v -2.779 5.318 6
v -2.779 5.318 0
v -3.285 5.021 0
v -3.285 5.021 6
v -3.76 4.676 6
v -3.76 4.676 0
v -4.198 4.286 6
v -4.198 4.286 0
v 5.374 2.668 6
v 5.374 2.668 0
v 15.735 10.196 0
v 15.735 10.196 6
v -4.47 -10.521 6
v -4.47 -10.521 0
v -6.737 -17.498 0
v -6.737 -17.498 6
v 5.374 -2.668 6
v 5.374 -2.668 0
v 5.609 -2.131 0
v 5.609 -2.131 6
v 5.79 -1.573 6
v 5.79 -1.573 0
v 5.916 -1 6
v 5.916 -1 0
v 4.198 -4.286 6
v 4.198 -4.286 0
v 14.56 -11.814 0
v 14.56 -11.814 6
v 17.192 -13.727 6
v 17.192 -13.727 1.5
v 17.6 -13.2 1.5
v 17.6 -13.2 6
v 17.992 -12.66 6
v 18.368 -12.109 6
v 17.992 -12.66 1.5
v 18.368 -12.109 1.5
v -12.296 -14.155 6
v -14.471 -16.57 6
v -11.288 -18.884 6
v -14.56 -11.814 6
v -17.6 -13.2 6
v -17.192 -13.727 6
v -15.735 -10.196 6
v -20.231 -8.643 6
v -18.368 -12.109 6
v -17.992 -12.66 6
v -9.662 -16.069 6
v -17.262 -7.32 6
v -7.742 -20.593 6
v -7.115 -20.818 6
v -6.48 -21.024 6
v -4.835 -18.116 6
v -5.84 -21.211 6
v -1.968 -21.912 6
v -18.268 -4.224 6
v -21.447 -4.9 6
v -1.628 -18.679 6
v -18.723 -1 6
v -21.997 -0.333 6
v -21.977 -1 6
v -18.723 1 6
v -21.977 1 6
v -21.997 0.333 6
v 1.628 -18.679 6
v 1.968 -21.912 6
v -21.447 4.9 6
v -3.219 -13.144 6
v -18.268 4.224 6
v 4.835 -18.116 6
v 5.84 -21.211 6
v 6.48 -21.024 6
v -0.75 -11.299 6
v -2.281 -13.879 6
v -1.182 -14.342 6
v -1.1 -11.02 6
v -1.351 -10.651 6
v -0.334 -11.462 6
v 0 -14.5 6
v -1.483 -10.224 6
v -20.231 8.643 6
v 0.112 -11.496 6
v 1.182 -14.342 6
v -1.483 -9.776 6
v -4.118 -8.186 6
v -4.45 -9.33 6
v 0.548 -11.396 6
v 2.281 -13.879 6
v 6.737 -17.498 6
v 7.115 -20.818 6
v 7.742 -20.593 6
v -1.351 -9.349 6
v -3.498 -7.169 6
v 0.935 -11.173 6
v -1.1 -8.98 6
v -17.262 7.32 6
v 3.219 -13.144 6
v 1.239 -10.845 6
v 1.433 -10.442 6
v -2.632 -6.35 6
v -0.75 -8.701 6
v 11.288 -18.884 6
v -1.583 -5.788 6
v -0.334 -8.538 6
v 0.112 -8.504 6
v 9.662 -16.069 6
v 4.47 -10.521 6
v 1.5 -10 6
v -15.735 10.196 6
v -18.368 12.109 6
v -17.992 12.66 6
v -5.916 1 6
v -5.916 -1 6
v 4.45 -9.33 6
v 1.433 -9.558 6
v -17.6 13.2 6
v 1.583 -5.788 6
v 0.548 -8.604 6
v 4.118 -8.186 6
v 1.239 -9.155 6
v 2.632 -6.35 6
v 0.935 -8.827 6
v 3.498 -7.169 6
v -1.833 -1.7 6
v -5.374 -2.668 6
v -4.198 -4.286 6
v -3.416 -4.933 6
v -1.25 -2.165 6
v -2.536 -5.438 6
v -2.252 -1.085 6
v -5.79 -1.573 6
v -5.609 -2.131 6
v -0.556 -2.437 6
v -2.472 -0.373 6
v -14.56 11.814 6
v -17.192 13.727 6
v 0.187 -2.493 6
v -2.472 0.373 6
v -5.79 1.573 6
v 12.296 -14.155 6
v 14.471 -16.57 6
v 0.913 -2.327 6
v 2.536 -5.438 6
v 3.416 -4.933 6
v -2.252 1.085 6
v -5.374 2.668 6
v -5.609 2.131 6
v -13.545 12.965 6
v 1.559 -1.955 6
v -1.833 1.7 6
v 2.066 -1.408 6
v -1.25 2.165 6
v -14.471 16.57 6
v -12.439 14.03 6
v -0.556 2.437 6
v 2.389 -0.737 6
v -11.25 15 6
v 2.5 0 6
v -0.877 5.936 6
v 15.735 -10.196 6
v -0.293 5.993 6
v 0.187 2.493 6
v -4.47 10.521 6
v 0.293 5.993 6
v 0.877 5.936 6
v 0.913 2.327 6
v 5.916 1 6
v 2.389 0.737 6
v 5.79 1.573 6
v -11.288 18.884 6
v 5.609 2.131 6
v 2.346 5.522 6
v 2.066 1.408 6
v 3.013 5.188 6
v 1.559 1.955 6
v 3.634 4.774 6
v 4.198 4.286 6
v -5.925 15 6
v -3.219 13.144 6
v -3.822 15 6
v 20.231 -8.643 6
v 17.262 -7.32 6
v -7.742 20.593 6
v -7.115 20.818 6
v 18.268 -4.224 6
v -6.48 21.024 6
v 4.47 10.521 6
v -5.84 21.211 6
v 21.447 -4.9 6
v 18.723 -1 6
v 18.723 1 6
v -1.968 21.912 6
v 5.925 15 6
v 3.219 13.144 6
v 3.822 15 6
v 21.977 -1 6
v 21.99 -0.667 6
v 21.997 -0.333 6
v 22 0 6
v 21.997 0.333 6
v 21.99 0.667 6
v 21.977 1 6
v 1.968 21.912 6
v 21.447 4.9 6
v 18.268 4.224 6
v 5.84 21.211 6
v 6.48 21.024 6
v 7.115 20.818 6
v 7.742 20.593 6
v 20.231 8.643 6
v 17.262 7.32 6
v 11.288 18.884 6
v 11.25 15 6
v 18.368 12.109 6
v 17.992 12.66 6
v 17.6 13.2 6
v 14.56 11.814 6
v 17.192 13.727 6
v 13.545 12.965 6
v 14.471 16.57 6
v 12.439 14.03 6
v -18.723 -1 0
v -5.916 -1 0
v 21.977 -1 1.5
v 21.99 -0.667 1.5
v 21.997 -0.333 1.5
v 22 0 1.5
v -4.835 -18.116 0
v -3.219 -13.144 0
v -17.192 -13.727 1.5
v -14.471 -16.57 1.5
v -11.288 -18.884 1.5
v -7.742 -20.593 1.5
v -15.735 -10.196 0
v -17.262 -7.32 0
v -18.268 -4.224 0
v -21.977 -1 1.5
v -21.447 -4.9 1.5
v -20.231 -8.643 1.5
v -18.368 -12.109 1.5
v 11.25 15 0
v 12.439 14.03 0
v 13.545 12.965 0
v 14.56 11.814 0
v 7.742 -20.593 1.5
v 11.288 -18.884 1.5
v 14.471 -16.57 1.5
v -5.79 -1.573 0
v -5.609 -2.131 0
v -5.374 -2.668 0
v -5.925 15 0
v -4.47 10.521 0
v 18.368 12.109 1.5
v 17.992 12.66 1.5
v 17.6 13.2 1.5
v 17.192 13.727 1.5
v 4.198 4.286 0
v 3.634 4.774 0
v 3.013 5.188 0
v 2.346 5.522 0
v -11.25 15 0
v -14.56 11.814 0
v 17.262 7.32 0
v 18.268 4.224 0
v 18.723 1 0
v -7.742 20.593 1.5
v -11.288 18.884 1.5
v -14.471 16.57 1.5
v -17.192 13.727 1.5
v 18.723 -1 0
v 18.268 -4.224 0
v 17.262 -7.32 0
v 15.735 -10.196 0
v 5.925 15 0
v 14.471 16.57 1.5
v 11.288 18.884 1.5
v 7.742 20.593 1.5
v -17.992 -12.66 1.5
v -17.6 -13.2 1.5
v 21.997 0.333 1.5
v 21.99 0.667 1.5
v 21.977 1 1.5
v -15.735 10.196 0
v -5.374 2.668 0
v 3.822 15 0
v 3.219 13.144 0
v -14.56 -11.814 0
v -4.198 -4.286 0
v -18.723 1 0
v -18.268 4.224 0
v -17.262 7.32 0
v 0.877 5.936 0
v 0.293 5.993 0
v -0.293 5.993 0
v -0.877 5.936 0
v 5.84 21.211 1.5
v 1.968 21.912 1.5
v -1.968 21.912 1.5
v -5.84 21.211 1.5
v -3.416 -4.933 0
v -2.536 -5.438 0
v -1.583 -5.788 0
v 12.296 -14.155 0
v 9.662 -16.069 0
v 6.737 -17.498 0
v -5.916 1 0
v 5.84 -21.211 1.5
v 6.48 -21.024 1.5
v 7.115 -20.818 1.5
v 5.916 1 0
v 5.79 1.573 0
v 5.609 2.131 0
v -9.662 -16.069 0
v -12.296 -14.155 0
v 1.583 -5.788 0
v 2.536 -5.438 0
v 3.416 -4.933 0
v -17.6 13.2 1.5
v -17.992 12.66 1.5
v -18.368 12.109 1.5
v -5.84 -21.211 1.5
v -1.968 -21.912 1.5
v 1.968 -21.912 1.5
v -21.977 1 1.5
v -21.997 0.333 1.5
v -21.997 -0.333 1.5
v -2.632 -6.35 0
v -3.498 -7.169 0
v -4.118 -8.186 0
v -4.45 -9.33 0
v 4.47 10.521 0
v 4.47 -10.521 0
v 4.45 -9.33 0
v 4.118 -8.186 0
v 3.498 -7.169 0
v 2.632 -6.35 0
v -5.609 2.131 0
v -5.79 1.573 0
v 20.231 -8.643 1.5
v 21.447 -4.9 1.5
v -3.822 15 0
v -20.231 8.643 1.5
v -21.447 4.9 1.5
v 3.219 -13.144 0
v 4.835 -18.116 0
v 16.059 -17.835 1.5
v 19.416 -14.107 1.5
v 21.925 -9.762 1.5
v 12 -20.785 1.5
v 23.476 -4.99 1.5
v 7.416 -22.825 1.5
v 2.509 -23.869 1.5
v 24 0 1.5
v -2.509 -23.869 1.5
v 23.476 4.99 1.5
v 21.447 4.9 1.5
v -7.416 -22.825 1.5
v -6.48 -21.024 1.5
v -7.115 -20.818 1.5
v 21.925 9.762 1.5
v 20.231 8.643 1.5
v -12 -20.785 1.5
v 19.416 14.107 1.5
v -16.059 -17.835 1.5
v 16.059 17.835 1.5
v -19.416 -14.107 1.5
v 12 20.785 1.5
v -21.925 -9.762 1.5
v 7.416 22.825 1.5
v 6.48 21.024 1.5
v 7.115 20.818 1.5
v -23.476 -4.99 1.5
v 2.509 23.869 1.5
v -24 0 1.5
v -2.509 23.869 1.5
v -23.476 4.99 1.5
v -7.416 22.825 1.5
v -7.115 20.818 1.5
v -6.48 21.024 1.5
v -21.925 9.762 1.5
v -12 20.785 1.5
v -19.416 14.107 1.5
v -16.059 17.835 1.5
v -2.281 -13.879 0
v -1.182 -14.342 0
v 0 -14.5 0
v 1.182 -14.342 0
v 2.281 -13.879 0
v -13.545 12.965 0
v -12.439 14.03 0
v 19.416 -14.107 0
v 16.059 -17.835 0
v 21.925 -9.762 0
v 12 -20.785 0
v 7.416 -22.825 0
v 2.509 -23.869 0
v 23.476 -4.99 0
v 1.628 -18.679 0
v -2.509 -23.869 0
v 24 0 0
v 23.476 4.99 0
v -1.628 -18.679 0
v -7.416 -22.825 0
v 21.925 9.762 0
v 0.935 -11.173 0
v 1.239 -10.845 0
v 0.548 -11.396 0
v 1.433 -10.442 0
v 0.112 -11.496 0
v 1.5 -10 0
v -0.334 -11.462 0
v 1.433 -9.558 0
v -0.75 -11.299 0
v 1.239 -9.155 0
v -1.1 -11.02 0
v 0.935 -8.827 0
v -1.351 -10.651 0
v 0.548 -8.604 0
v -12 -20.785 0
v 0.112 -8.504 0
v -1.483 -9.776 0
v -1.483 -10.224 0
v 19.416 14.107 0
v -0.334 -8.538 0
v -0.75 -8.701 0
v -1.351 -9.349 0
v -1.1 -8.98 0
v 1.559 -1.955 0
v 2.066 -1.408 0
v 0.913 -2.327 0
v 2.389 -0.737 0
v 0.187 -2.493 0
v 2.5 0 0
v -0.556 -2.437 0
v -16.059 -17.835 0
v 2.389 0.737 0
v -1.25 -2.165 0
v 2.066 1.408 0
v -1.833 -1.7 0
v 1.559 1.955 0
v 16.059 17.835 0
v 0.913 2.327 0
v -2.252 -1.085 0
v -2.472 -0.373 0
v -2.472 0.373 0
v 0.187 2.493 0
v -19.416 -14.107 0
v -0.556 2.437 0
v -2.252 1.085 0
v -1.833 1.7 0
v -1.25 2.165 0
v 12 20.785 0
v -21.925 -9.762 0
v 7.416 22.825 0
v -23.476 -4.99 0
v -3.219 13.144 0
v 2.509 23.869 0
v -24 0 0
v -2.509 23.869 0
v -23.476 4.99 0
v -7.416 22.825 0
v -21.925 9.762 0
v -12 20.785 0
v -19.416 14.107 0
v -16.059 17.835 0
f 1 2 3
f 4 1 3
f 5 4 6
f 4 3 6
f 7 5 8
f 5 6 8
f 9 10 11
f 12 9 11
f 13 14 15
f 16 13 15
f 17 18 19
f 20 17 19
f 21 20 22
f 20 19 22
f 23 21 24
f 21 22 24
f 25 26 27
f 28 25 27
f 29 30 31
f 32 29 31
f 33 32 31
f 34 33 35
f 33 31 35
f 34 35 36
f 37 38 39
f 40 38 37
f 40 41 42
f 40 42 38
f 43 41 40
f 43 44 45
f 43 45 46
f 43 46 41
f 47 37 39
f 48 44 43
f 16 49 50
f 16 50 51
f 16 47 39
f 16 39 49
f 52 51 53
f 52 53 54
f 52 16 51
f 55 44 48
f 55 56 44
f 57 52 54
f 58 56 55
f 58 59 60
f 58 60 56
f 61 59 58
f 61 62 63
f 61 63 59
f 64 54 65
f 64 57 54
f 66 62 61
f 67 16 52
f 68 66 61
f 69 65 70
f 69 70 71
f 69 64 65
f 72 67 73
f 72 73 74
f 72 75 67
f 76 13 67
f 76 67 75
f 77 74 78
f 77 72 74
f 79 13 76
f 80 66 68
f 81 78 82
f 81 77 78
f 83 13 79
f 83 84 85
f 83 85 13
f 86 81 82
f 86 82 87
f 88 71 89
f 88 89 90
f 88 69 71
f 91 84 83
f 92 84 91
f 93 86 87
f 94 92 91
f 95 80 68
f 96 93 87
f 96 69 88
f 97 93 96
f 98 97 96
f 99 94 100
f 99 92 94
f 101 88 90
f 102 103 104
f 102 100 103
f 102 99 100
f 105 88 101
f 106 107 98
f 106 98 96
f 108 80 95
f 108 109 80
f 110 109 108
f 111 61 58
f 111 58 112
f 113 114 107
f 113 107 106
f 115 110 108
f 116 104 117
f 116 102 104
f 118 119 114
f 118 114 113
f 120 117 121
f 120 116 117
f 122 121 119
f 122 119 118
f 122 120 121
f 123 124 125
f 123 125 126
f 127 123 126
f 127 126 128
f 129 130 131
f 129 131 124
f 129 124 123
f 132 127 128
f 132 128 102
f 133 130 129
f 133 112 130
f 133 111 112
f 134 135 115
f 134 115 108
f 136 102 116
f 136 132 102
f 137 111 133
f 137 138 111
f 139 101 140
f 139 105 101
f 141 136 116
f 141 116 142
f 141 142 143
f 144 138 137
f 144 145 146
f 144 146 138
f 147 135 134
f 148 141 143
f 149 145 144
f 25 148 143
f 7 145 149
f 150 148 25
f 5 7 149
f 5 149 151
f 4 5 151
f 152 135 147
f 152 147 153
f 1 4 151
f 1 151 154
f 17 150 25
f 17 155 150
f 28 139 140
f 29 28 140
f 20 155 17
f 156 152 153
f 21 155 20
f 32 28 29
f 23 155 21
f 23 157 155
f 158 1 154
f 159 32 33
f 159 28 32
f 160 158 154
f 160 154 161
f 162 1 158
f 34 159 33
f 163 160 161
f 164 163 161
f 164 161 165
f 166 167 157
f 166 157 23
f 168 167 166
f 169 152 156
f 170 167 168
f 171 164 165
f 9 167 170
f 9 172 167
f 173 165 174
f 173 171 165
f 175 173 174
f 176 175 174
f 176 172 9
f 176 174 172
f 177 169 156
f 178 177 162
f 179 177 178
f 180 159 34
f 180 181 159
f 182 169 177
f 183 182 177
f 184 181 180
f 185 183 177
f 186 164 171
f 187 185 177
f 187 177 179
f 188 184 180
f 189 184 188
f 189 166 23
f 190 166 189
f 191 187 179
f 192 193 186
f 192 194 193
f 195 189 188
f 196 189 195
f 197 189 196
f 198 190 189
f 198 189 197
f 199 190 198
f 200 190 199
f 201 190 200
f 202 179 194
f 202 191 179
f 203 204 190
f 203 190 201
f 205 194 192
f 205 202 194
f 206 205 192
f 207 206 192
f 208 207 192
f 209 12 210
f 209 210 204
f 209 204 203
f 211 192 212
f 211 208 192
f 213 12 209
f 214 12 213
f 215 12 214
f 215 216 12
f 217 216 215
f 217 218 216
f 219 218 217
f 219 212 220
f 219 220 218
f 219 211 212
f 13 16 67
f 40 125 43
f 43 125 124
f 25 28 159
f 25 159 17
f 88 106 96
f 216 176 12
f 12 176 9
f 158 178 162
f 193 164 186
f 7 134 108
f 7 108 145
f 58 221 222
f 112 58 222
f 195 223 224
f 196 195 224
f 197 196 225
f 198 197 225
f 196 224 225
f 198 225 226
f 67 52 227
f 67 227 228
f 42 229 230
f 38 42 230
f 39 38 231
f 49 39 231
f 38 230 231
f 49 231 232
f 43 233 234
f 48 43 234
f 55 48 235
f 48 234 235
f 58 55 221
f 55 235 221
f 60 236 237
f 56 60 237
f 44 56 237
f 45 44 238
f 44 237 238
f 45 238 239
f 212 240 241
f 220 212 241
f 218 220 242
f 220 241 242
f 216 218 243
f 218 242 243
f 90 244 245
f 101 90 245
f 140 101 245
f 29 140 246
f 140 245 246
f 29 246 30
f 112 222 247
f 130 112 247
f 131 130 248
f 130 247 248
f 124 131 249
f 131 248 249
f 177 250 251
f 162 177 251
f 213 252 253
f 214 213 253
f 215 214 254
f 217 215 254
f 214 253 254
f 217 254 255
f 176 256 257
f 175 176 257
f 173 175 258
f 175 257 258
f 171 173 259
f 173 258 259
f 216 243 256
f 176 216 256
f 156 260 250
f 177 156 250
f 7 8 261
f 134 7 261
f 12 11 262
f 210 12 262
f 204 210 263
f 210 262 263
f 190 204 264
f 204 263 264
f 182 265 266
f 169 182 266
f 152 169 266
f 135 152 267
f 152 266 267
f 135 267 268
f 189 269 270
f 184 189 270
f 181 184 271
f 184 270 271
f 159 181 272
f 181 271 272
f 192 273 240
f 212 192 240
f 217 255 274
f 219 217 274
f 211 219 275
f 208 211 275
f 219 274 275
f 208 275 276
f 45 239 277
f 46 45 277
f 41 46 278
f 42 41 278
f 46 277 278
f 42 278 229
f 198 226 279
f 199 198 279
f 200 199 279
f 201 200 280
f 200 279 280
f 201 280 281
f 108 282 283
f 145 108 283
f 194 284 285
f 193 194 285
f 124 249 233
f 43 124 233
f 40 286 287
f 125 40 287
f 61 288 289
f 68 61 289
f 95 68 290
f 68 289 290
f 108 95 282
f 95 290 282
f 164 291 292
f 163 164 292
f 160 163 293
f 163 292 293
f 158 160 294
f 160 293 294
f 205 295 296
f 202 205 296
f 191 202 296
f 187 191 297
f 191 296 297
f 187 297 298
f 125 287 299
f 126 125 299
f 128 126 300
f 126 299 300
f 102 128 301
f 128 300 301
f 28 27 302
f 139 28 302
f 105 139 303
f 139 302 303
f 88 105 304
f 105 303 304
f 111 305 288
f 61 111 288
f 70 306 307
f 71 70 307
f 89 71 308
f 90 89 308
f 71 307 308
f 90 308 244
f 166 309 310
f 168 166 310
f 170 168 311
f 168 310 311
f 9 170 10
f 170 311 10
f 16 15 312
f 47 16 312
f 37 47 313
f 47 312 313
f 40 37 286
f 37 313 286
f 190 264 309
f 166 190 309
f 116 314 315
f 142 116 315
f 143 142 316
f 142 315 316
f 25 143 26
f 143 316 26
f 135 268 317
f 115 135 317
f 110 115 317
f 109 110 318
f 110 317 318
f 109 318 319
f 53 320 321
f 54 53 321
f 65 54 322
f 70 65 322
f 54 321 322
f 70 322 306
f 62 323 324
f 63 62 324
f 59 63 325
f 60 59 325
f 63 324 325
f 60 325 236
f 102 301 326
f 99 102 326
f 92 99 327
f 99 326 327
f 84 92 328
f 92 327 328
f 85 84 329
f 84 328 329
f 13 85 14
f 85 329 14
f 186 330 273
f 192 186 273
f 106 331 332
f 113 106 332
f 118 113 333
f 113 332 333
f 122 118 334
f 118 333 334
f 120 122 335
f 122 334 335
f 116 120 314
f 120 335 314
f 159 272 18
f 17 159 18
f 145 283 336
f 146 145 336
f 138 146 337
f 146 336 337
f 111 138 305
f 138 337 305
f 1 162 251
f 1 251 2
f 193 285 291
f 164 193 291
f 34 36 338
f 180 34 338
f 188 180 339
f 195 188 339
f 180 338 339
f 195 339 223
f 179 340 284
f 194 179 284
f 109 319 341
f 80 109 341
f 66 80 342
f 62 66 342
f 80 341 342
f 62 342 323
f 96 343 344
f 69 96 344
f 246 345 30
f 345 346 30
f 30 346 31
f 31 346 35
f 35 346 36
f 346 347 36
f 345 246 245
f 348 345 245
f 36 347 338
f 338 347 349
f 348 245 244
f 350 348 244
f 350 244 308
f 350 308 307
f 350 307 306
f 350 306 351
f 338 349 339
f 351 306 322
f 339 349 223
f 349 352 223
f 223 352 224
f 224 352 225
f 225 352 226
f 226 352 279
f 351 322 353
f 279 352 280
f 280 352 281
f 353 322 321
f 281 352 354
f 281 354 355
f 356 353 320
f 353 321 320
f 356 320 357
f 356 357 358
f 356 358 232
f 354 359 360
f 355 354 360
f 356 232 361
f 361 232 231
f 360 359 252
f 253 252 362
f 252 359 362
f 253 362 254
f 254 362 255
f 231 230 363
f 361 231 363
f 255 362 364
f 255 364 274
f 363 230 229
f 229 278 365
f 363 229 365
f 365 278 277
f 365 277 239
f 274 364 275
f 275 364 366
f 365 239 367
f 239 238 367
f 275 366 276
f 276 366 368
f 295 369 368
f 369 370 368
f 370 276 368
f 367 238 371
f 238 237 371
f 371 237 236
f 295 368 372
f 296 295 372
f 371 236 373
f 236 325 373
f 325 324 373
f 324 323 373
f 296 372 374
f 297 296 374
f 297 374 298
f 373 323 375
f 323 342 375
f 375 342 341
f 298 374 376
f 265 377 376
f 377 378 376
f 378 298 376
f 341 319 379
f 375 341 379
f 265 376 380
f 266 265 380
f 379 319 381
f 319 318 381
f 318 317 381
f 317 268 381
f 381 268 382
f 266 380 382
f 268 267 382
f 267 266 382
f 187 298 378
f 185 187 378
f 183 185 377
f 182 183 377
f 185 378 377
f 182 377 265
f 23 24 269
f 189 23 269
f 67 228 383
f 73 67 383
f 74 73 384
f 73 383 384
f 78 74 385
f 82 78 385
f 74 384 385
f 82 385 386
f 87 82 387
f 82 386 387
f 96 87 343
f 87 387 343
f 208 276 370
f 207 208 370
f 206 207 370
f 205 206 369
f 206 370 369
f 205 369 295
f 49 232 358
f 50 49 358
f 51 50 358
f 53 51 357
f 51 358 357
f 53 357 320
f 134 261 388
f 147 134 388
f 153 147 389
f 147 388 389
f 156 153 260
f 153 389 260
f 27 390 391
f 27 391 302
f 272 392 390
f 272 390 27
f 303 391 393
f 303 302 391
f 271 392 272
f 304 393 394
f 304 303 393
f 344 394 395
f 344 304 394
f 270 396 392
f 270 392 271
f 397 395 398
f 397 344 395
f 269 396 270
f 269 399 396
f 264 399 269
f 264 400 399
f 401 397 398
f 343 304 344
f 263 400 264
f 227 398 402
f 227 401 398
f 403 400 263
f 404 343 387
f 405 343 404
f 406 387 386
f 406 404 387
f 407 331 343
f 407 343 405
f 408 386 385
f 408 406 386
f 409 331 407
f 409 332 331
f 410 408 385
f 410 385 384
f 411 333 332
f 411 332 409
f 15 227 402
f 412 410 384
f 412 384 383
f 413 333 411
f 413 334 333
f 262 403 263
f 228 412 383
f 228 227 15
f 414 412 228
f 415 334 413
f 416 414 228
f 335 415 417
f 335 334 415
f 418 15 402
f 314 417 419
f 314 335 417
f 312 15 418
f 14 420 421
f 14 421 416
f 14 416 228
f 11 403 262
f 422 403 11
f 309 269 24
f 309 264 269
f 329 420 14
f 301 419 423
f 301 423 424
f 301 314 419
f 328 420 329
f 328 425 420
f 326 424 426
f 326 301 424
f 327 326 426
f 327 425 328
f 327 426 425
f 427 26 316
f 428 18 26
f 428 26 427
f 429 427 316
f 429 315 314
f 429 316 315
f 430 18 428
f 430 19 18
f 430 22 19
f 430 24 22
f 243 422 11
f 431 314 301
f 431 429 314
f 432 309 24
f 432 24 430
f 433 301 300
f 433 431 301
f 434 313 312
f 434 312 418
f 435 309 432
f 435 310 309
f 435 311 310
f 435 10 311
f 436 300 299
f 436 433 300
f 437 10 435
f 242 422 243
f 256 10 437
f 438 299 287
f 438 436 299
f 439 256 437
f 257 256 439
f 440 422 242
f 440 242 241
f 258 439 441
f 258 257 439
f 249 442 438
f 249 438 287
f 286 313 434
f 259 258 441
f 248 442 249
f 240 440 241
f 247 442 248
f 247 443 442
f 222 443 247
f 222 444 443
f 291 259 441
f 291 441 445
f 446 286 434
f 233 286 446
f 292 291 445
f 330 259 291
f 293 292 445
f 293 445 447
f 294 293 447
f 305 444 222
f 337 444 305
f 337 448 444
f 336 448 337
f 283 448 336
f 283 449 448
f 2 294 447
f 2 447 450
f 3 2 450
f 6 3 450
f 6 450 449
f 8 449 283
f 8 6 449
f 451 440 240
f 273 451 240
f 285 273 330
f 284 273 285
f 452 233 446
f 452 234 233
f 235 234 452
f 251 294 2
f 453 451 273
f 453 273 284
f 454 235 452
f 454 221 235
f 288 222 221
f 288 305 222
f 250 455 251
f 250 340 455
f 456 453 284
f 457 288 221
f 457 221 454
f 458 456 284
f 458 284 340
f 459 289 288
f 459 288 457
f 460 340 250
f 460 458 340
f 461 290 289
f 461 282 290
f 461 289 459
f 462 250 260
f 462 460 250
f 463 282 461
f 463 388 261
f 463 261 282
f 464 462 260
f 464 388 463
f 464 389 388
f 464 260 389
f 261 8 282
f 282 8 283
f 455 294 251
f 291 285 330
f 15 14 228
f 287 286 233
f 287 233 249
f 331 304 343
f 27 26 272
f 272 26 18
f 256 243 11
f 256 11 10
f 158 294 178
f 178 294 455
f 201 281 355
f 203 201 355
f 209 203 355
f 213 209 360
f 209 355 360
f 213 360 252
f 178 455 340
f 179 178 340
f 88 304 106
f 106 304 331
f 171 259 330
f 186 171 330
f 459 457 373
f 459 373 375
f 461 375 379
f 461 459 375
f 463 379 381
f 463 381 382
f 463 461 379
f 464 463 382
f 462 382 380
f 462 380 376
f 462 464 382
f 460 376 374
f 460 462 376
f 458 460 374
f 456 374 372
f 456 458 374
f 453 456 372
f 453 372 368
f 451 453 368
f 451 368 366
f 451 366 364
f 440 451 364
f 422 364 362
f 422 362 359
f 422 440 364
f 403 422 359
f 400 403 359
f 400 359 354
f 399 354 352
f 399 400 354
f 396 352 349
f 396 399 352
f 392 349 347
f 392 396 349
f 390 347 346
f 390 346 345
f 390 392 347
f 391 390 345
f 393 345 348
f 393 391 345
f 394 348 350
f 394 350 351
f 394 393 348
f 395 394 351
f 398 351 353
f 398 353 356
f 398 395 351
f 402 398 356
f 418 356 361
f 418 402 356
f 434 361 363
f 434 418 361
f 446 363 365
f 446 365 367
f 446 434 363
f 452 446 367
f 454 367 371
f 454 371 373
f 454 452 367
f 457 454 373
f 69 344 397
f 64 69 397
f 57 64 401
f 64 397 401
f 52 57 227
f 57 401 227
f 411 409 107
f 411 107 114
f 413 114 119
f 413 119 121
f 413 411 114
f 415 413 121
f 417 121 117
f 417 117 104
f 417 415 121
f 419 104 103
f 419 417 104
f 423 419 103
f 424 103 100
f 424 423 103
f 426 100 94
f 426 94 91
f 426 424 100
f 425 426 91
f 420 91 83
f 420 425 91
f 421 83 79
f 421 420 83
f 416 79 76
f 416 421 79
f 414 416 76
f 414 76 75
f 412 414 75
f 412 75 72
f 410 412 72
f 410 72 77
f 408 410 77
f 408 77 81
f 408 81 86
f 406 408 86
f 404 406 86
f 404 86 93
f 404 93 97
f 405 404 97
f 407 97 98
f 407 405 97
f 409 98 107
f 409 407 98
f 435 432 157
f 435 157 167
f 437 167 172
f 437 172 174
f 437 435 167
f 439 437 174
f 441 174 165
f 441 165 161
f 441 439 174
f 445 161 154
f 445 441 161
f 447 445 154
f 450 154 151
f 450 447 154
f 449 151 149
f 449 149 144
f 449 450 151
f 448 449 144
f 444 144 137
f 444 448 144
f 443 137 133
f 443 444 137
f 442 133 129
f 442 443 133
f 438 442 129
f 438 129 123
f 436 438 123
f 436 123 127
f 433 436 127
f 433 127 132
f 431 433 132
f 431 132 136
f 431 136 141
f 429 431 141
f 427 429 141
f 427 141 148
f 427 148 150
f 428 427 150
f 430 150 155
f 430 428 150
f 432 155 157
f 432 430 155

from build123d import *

# Parameters (mm, degrees)
ESQUISSE1_R        = 6
ESQUISSE1_R_2      = 2.5
ESQUISSE1_R_3      = 1.5
BOSS_EXTRU_1_DEPTH = 6
ESQUISSE4_R        = 24
ESQUISSE4_R_2      = 22
BOSS_EXTRU_3_DEPTH = 1.5


with BuildPart() as part:
    # Esquisse1 → Boss.-Extru.1 (new body)
    # profile 1 of 57: a face of its own
    with BuildSketch(Plane.XY):
        Circle(ESQUISSE1_R)
        Circle(ESQUISSE1_R_2, mode=Mode.SUBTRACT)
    # profile 2 of 57: a face of its own
    with BuildSketch(Plane.XY):
        with BuildLine():
            ThreePointArc((4.469792035, -10.520537382), (3.841677281, -7.656601684), (1.582669817, -5.7875))
            ThreePointArc((1.582669817, -5.7875), (0, -6), (-1.582669817, -5.7875))
            ThreePointArc((-1.582669817, -5.7875), (-3.841677281, -7.656601684), (-4.469792035, -10.520537382))
            ThreePointArc((-4.469792035, -10.520537382), (-4.06221109, -11.936089115), (-3.219339867, -13.144177288))
            ThreePointArc((-3.219339867, -13.144177288), (0, -14.5), (3.219339867, -13.144177288))
            ThreePointArc((3.219339867, -13.144177288), (4.06221109, -11.936089115), (4.469792035, -10.520537382))
        make_face()
        with Locations((0, -10)):
            Circle(ESQUISSE1_R_3, mode=Mode.SUBTRACT)
    # profile 3 of 57: a face of its own
    with BuildSketch(Plane.XY):
        with BuildLine():
            ThreePointArc((4.834765807, -18.115947107), (5.794068645, -17.832309681), (6.736878839, -17.497913119))
            Line((6.736878839, -17.497913119), (4.469792035, -10.520537382))
            ThreePointArc((4.469792035, -10.520537382), (4.06221109, -11.936089115), (3.219339867, -13.144177288))
            Line((3.219339867, -13.144177288), (4.834765807, -18.115947107))
        make_face()
    # profile 4 of 57: a face of its own
    with BuildSketch(Plane.XY):
        with BuildLine():
            ThreePointArc((-3.219339867, -13.144177288), (-4.06221109, -11.936089115), (-4.469792035, -10.520537382))
            Line((-4.469792035, -10.520537382), (-6.736878839, -17.497913119))
            ThreePointArc((-6.736878839, -17.497913119), (-5.794068645, -17.832309681), (-4.834765807, -18.115947107))
            Line((-4.834765807, -18.115947107), (-3.219339867, -13.144177288))
        make_face()
    # profile 5 of 57: a face of its own
    with BuildSketch(Plane.XY):
        with BuildLine():
            Line((-14.559694243, -11.814305039), (-4.198423832, -4.286401442))
            ThreePointArc((-4.198423832, -4.286401442), (-4.854101966, -3.526711514), (-5.373994337, -2.668367454))
            Line((-5.373994337, -2.668367454), (-15.735264747, -10.196271051))
            ThreePointArc((-15.735264747, -10.196271051), (-15.169068645, -11.02097348), (-14.559694243, -11.814305039))
        make_face()
    # profile 6 of 57: a face of its own
    with BuildSketch(Plane.XY):
        with BuildLine():
            Line((-18.723314343, -1), (-5.916079783, -1))
            ThreePointArc((-5.916079783, -1), (-6, 0), (-5.916079783, 1))
            Line((-5.916079783, 1), (-18.723314343, 1))
            ThreePointArc((-18.723314343, 1), (-18.75, 0), (-18.723314343, -1))
        make_face()
    # profile 7 of 57: a face of its own
    with BuildSketch(Plane.XY):
        with BuildLine():
            Line((-15.735264747, 10.196271051), (-5.373994337, 2.668367454))
            ThreePointArc((-5.373994337, 2.668367454), (-4.854101966, 3.526711514), (-4.198423832, 4.286401442))
            Line((-4.198423832, 4.286401442), (-14.559694243, 11.814305039))
            ThreePointArc((-14.559694243, 11.814305039), (-15.169068645, 11.02097348), (-15.735264747, 10.196271051))
        make_face()
    # profile 8 of 57: a face of its own
    with BuildSketch(Plane.XY):
        with BuildLine():
            ThreePointArc((-2.779225709, 5.317509234), (-1.854101966, 5.706339098), (-0.877112677, 5.935543223))
            Line((-0.877112677, 5.935543223), (-3.219339867, 13.144177288))
            Line((-3.219339867, 13.144177288), (-3.822333219, 15))
            Line((-3.822333219, 15), (-5.925257668, 15))
            Line((-5.925257668, 15), (-4.469792035, 10.520537382))
            Line((-4.469792035, 10.520537382), (-2.779225709, 5.317509234))
        make_face()
    # profile 9 of 57: a face of its own
    with BuildSketch(Plane.XY):
        with BuildLine():
            ThreePointArc((0.877112677, 5.935543223), (1.624852602, 5.775798994), (2.346205228, 5.522256878))
            Line((2.346205228, 5.522256878), (4.469792035, 10.520537382))
            Line((4.469792035, 10.520537382), (5.925257668, 15))
            Line((5.925257668, 15), (3.822333219, 15))
            Line((3.822333219, 15), (3.219339867, 13.144177288))
            Line((3.219339867, 13.144177288), (0.877112677, 5.935543223))
        make_face()
    # profile 10 of 57: a face of its own
    with BuildSketch(Plane.XY):
        with BuildLine():
            ThreePointArc((4.198423832, 4.286401442), (4.854101966, 3.526711514), (5.373994337, 2.668367454))
            Line((5.373994337, 2.668367454), (15.735264747, 10.196271051))
            ThreePointArc((15.735264747, 10.196271051), (15.169068645, 11.02097348), (14.559694243, 11.814305039))
            Line((14.559694243, 11.814305039), (4.198423832, 4.286401442))
        make_face()
    # profile 11 of 57: a face of its own
    with BuildSketch(Plane.XY):
        with BuildLine():
            ThreePointArc((6, 0), (5.978983137, -0.501757562), (5.916079783, -1))
            Line((5.916079783, -1), (18.723314343, -1))
            ThreePointArc((18.723314343, -1), (18.743327399, -0.500177999), (18.75, 0))
            ThreePointArc((18.75, 0), (18.743327399, 0.500177999), (18.723314343, 1))
            Line((18.723314343, 1), (5.916079783, 1))
            ThreePointArc((5.916079783, 1), (5.978983137, 0.501757562), (6, 0))
        make_face()
    # profile 12 of 57: a face of its own
    with BuildSketch(Plane.XY):
        with BuildLine():
            Line((15.735264747, -10.196271051), (5.373994337, -2.668367454))
            ThreePointArc((5.373994337, -2.668367454), (4.854101966, -3.526711514), (4.198423832, -4.286401442))
            Line((4.198423832, -4.286401442), (14.559694243, -11.814305039))
            ThreePointArc((14.559694243, -11.814305039), (15.169068645, -11.02097348), (15.735264747, -10.196271051))
        make_face()
    # profile 13 of 57: a face of its own
    with BuildSketch(Plane.XY):
        with BuildLine():
            ThreePointArc((-6.968959178, -18.212182955), (-11.46181242, -15.77583139), (-15.167288456, -12.255748075))
            Line((-15.167288456, -12.255748075), (-17.192192367, -13.726926882))
            ThreePointArc((-17.192192367, -13.726926882), (-12.93127555, -17.798373876), (-7.742403648, -20.592600267))
            Line((-7.742403648, -20.592600267), (-6.968959178, -18.212182955))
        make_face()
    # profile 14 of 57: a face of its own
    with BuildSketch(Plane.XY):
        with BuildLine():
            Line((-17.192192367, -13.726926882), (-15.167288456, -12.255748075))
            ThreePointArc((-15.167288456, -12.255748075), (-15.77583139, -11.46181242), (-16.342858961, -10.637714087))
            Line((-16.342858961, -10.637714087), (-18.367762872, -12.108892893))
            ThreePointArc((-18.367762872, -12.108892893), (-17.798373876, -12.93127555), (-17.192192367, -13.726926882))
        make_face()
    # profile 15 of 57: a face of its own
    with BuildSketch(Plane.XY):
        with BuildLine():
            Line((-18.367762872, -12.108892893), (-16.342858961, -10.637714087))
            ThreePointArc((-16.342858961, -10.637714087), (-18.545602068, -6.02583139), (-19.474342094, -1))
            Line((-19.474342094, -1), (-21.977260976, -1))
            ThreePointArc((-21.977260976, -1), (-20.923243358, -6.798373876), (-18.367762872, -12.108892893))
        make_face()
    # profile 16 of 57: a face of its own
    with BuildSketch(Plane.XY):
        with BuildLine():
            Line((-21.977260976, -1), (-19.474342094, -1))
            ThreePointArc((-19.474342094, -1), (-19.5, 0), (-19.474342094, 1))
            Line((-19.474342094, 1), (-21.977260976, 1))
            ThreePointArc((-21.977260976, 1), (-22, 0), (-21.977260976, -1))
        make_face()
    # profile 17 of 57: a face of its own
    with BuildSketch(Plane.XY):
        with BuildLine():
            Line((-21.977260976, 1), (-19.474342094, 1))
            ThreePointArc((-19.474342094, 1), (-18.545602068, 6.02583139), (-16.342858961, 10.637714087))
            Line((-16.342858961, 10.637714087), (-18.367762872, 12.108892893))
            ThreePointArc((-18.367762872, 12.108892893), (-20.923243358, 6.798373876), (-21.977260976, 1))
        make_face()
    # profile 18 of 57: a face of its own
    with BuildSketch(Plane.XY):
        with BuildLine():
            Line((-18.367762872, 12.108892893), (-16.342858961, 10.637714087))
            ThreePointArc((-16.342858961, 10.637714087), (-15.77583139, 11.46181242), (-15.167288456, 12.255748075))
            Line((-15.167288456, 12.255748075), (-17.192192367, 13.726926882))
            ThreePointArc((-17.192192367, 13.726926882), (-17.798373876, 12.93127555), (-18.367762872, 12.108892893))
        make_face()
    # profile 19 of 57: a face of its own
    with BuildSketch(Plane.XY):
        with BuildLine():
            ThreePointArc((-15.167288456, 12.255748075), (-11.46181242, 15.77583139), (-6.968959178, 18.212182955))
            Line((-6.968959178, 18.212182955), (-7.742403648, 20.592600267))
            ThreePointArc((-7.742403648, 20.592600267), (-12.93127555, 17.798373876), (-17.192192367, 13.726926882))
            Line((-17.192192367, 13.726926882), (-15.167288456, 12.255748075))
        make_face()
    # profile 20 of 57: a face of its own
    with BuildSketch(Plane.XY):
        with BuildLine():
            ThreePointArc((-6.968959178, 18.212182955), (-6.02583139, 18.545602068), (-5.066846145, 18.830216944))
            Line((-5.066846145, 18.830216944), (-5.840290615, 21.210634256))
            ThreePointArc((-5.840290615, 21.210634256), (-6.798373876, 20.923243358), (-7.742403648, 20.592600267))
            Line((-7.742403648, 20.592600267), (-6.968959178, 18.212182955))
        make_face()
    # profile 21 of 57: a face of its own
    with BuildSketch(Plane.XY):
        with BuildLine():
            Line((-11.25, 15), (-5.925257668, 15))
            Line((-5.925257668, 15), (-6.736878839, 17.497913119))
            ThreePointArc((-6.736878839, 17.497913119), (-9.079749175, 16.404897285), (-11.25, 15))
        make_face()
    # profile 22 of 57: a face of its own
    with BuildSketch(Plane.XY):
        with BuildLine():
            Line((-15.167288456, 12.255748075), (-14.559694243, 11.814305039))
            ThreePointArc((-14.559694243, 11.814305039), (-13.002778254, 13.508895502), (-11.25, 15))
            ThreePointArc((-11.25, 15), (-9.079749175, 16.404897285), (-6.736878839, 17.497913119))
            Line((-6.736878839, 17.497913119), (-6.968959178, 18.212182955))
            ThreePointArc((-6.968959178, 18.212182955), (-11.46181242, 15.77583139), (-15.167288456, 12.255748075))
        make_face()
    # profile 23 of 57: a face of its own
    with BuildSketch(Plane.XY):
        with BuildLine():
            Line((-16.342858961, 10.637714087), (-15.735264747, 10.196271051))
            ThreePointArc((-15.735264747, 10.196271051), (-15.169068645, 11.02097348), (-14.559694243, 11.814305039))
            Line((-14.559694243, 11.814305039), (-15.167288456, 12.255748075))
            ThreePointArc((-15.167288456, 12.255748075), (-15.77583139, 11.46181242), (-16.342858961, 10.637714087))
        make_face()
    # profile 24 of 57: a face of its own
    with BuildSketch(Plane.XY):
        with BuildLine():
            Line((-4.834765807, 18.115947107), (-5.066846145, 18.830216944))
            ThreePointArc((-5.066846145, 18.830216944), (-6.02583139, 18.545602068), (-6.968959178, 18.212182955))
            Line((-6.968959178, 18.212182955), (-6.736878839, 17.497913119))
            ThreePointArc((-6.736878839, 17.497913119), (-5.794068645, 17.832309681), (-4.834765807, 18.115947107))
        make_face()
    # profile 25 of 57: a face of its own
    with BuildSketch(Plane.XY):
        with BuildLine():
            Line((-5.925257668, 15), (-3.822333219, 15))
            Line((-3.822333219, 15), (-4.834765807, 18.115947107))
            ThreePointArc((-4.834765807, 18.115947107), (-5.794068645, 17.832309681), (-6.736878839, 17.497913119))
            Line((-6.736878839, 17.497913119), (-5.925257668, 15))
        make_face()
    # profile 26 of 57: a face of its own
    with BuildSketch(Plane.XY):
        with BuildLine():
            Line((-3.822333219, 15), (3.822333219, 15))
            Line((3.822333219, 15), (4.834765807, 18.115947107))
            ThreePointArc((4.834765807, 18.115947107), (0, 18.75), (-4.834765807, 18.115947107))
            Line((-4.834765807, 18.115947107), (-3.822333219, 15))
        make_face()
    # profile 27 of 57: a face of its own
    with BuildSketch(Plane.XY):
        with BuildLine():
            Line((4.834765807, 18.115947107), (5.066846145, 18.830216944))
            ThreePointArc((5.066846145, 18.830216944), (0, 19.5), (-5.066846145, 18.830216944))
            Line((-5.066846145, 18.830216944), (-4.834765807, 18.115947107))
            ThreePointArc((-4.834765807, 18.115947107), (0, 18.75), (4.834765807, 18.115947107))
        make_face()
    # profile 28 of 57: a face of its own
    with BuildSketch(Plane.XY):
        with BuildLine():
            Line((3.822333219, 15), (5.925257668, 15))
            Line((5.925257668, 15), (6.736878839, 17.497913119))
            ThreePointArc((6.736878839, 17.497913119), (5.794068645, 17.832309681), (4.834765807, 18.115947107))
            Line((4.834765807, 18.115947107), (3.822333219, 15))
        make_face()
    # profile 29 of 57: a face of its own
    with BuildSketch(Plane.XY):
        with BuildLine():
            Line((6.736878839, 17.497913119), (6.968959178, 18.212182955))
            ThreePointArc((6.968959178, 18.212182955), (6.02583139, 18.545602068), (5.066846145, 18.830216944))
            Line((5.066846145, 18.830216944), (4.834765807, 18.115947107))
            ThreePointArc((4.834765807, 18.115947107), (5.794068645, 17.832309681), (6.736878839, 17.497913119))
        make_face()
    # profile 30 of 57: a face of its own
    with BuildSketch(Plane.XY):
        with BuildLine():
            ThreePointArc((11.25, 15), (13.002778254, 13.508895502), (14.559694243, 11.814305039))
            Line((14.559694243, 11.814305039), (15.167288456, 12.255748075))
            ThreePointArc((15.167288456, 12.255748075), (11.46181242, 15.77583139), (6.968959178, 18.212182955))
            Line((6.968959178, 18.212182955), (6.736878839, 17.497913119))
            ThreePointArc((6.736878839, 17.497913119), (9.079749175, 16.404897285), (11.25, 15))
        make_face()
    # profile 31 of 57: a face of its own
    with BuildSketch(Plane.XY):
        with BuildLine():
            Line((5.925257668, 15), (11.25, 15))
            ThreePointArc((11.25, 15), (9.079749175, 16.404897285), (6.736878839, 17.497913119))
            Line((6.736878839, 17.497913119), (5.925257668, 15))
        make_face()
    # profile 32 of 57: a face of its own
    with BuildSketch(Plane.XY):
        with BuildLine():
            ThreePointArc((6.968959178, 18.212182955), (11.46181242, 15.77583139), (15.167288456, 12.255748075))
            Line((15.167288456, 12.255748075), (17.192192367, 13.726926882))
            ThreePointArc((17.192192367, 13.726926882), (12.93127555, 17.798373876), (7.742403648, 20.592600267))
            Line((7.742403648, 20.592600267), (6.968959178, 18.212182955))
        make_face()
    # profile 33 of 57: a face of its own
    with BuildSketch(Plane.XY):
        with BuildLine():
            ThreePointArc((5.066846145, 18.830216944), (6.02583139, 18.545602068), (6.968959178, 18.212182955))
            Line((6.968959178, 18.212182955), (7.742403648, 20.592600267))
            ThreePointArc((7.742403648, 20.592600267), (6.798373876, 20.923243358), (5.840290615, 21.210634256))
            Line((5.840290615, 21.210634256), (5.066846145, 18.830216944))
        make_face()
    # profile 34 of 57: a face of its own
    with BuildSketch(Plane.XY):
        with BuildLine():
            ThreePointArc((15.167288456, 12.255748075), (15.77583139, 11.46181242), (16.342858961, 10.637714087))
            Line((16.342858961, 10.637714087), (18.367762872, 12.108892893))
            ThreePointArc((18.367762872, 12.108892893), (17.798373876, 12.93127555), (17.192192367, 13.726926882))
            Line((17.192192367, 13.726926882), (15.167288456, 12.255748075))
        make_face()
    # profile 35 of 57: a face of its own
    with BuildSketch(Plane.XY):
        with BuildLine():
            ThreePointArc((16.342858961, 10.637714087), (18.545602068, 6.02583139), (19.474342094, 1))
            Line((19.474342094, 1), (21.977260976, 1))
            ThreePointArc((21.977260976, 1), (20.923243358, 6.798373876), (18.367762872, 12.108892893))
            Line((18.367762872, 12.108892893), (16.342858961, 10.637714087))
        make_face()
    # profile 36 of 57: a face of its own
    with BuildSketch(Plane.XY):
        with BuildLine():
            ThreePointArc((-5.066846145, 18.830216944), (0, 19.5), (5.066846145, 18.830216944))
            Line((5.066846145, 18.830216944), (5.840290615, 21.210634256))
            ThreePointArc((5.840290615, 21.210634256), (0, 22), (-5.840290615, 21.210634256))
            Line((-5.840290615, 21.210634256), (-5.066846145, 18.830216944))
        make_face()
    # profile 37 of 57: a face of its own
    with BuildSketch(Plane.XY):
        with BuildLine():
            ThreePointArc((19.5, 0), (19.493584468, -0.500164555), (19.474342094, -1))
            Line((19.474342094, -1), (21.977260976, -1))
            ThreePointArc((21.977260976, -1), (21.994314509, -0.500129249), (22, 0))
            ThreePointArc((22, 0), (21.994314509, 0.500129249), (21.977260976, 1))
            Line((21.977260976, 1), (19.474342094, 1))
            ThreePointArc((19.474342094, 1), (19.493584468, 0.500164555), (19.5, 0))
        make_face()
    # profile 38 of 57: a face of its own
    with BuildSketch(Plane.XY):
        with BuildLine():
            ThreePointArc((18.75, 0), (18.743327399, -0.500177999), (18.723314343, -1))
            Line((18.723314343, -1), (19.474342094, -1))
            ThreePointArc((19.474342094, -1), (19.493584468, -0.500164555), (19.5, 0))
            ThreePointArc((19.5, 0), (19.493584468, 0.500164555), (19.474342094, 1))
            Line((19.474342094, 1), (18.723314343, 1))
            ThreePointArc((18.723314343, 1), (18.743327399, 0.500177999), (18.75, 0))
        make_face()
    # profile 39 of 57: a face of its own
    with BuildSketch(Plane.XY):
        with BuildLine():
            ThreePointArc((15.735264747, 10.196271051), (17.832309681, 5.794068645), (18.723314343, 1))
            Line((18.723314343, 1), (19.474342094, 1))
            ThreePointArc((19.474342094, 1), (18.545602068, 6.02583139), (16.342858961, 10.637714087))
            Line((16.342858961, 10.637714087), (15.735264747, 10.196271051))
        make_face()
    # profile 40 of 57: a face of its own
    with BuildSketch(Plane.XY):
        with BuildLine():
            ThreePointArc((14.559694243, 11.814305039), (15.169068645, 11.02097348), (15.735264747, 10.196271051))
            Line((15.735264747, 10.196271051), (16.342858961, 10.637714087))
            ThreePointArc((16.342858961, 10.637714087), (15.77583139, 11.46181242), (15.167288456, 12.255748075))
            Line((15.167288456, 12.255748075), (14.559694243, 11.814305039))
        make_face()
    # profile 41 of 57: a face of its own
    with BuildSketch(Plane.XY):
        with BuildLine():
            ThreePointArc((19.474342094, -1), (18.545602068, -6.02583139), (16.342858961, -10.637714087))
            Line((16.342858961, -10.637714087), (18.367762872, -12.108892893))
            ThreePointArc((18.367762872, -12.108892893), (20.923243358, -6.798373876), (21.977260976, -1))
            Line((21.977260976, -1), (19.474342094, -1))
        make_face()
    # profile 42 of 57: a face of its own
    with BuildSketch(Plane.XY):
        with BuildLine():
            ThreePointArc((18.723314343, -1), (17.832309681, -5.794068645), (15.735264747, -10.196271051))
            Line((15.735264747, -10.196271051), (16.342858961, -10.637714087))
            ThreePointArc((16.342858961, -10.637714087), (18.545602068, -6.02583139), (19.474342094, -1))
            Line((19.474342094, -1), (18.723314343, -1))
        make_face()
    # profile 43 of 57: a face of its own
    with BuildSketch(Plane.XY):
        with BuildLine():
            Line((18.367762872, -12.108892893), (16.342858961, -10.637714087))
            ThreePointArc((16.342858961, -10.637714087), (15.77583139, -11.46181242), (15.167288456, -12.255748075))
            Line((15.167288456, -12.255748075), (17.192192367, -13.726926882))
            ThreePointArc((17.192192367, -13.726926882), (17.798373876, -12.93127555), (18.367762872, -12.108892893))
        make_face()
    # profile 44 of 57: a face of its own
    with BuildSketch(Plane.XY):
        with BuildLine():
            Line((16.342858961, -10.637714087), (15.735264747, -10.196271051))
            ThreePointArc((15.735264747, -10.196271051), (15.169068645, -11.02097348), (14.559694243, -11.814305039))
            Line((14.559694243, -11.814305039), (15.167288456, -12.255748075))
            ThreePointArc((15.167288456, -12.255748075), (15.77583139, -11.46181242), (16.342858961, -10.637714087))
        make_face()
    # profile 45 of 57: a face of its own
    with BuildSketch(Plane.XY):
        with BuildLine():
            Line((17.192192367, -13.726926882), (15.167288456, -12.255748075))
            ThreePointArc((15.167288456, -12.255748075), (11.46181242, -15.77583139), (6.968959178, -18.212182955))
            Line((6.968959178, -18.212182955), (7.742403648, -20.592600267))
            ThreePointArc((7.742403648, -20.592600267), (12.93127555, -17.798373876), (17.192192367, -13.726926882))
        make_face()
    # profile 46 of 57: a face of its own
    with BuildSketch(Plane.XY):
        with BuildLine():
            Line((15.167288456, -12.255748075), (14.559694243, -11.814305039))
            ThreePointArc((14.559694243, -11.814305039), (11.02097348, -15.169068645), (6.736878839, -17.497913119))
            Line((6.736878839, -17.497913119), (6.968959178, -18.212182955))
            ThreePointArc((6.968959178, -18.212182955), (11.46181242, -15.77583139), (15.167288456, -12.255748075))
        make_face()
    # profile 47 of 57: a face of its own
    with BuildSketch(Plane.XY):
        with BuildLine():
            Line((7.742403648, -20.592600267), (6.968959178, -18.212182955))
            ThreePointArc((6.968959178, -18.212182955), (6.02583139, -18.545602068), (5.066846145, -18.830216944))
            Line((5.066846145, -18.830216944), (5.840290615, -21.210634256))
            ThreePointArc((5.840290615, -21.210634256), (6.798373876, -20.923243358), (7.742403648, -20.592600267))
        make_face()
    # profile 48 of 57: a face of its own
    with BuildSketch(Plane.XY):
        with BuildLine():
            Line((6.968959178, -18.212182955), (6.736878839, -17.497913119))
            ThreePointArc((6.736878839, -17.497913119), (5.794068645, -17.832309681), (4.834765807, -18.115947107))
            Line((4.834765807, -18.115947107), (5.066846145, -18.830216944))
            ThreePointArc((5.066846145, -18.830216944), (6.02583139, -18.545602068), (6.968959178, -18.212182955))
        make_face()
    # profile 49 of 57: a face of its own
    with BuildSketch(Plane.XY):
        with BuildLine():
            Line((5.066846145, -18.830216944), (4.834765807, -18.115947107))
            ThreePointArc((4.834765807, -18.115947107), (0, -18.75), (-4.834765807, -18.115947107))
            Line((-4.834765807, -18.115947107), (-5.066846145, -18.830216944))
            ThreePointArc((-5.066846145, -18.830216944), (0, -19.5), (5.066846145, -18.830216944))
        make_face()
    # profile 50 of 57: a face of its own
    with BuildSketch(Plane.XY):
        with BuildLine():
            Line((5.840290615, -21.210634256), (5.066846145, -18.830216944))
            ThreePointArc((5.066846145, -18.830216944), (0, -19.5), (-5.066846145, -18.830216944))
            Line((-5.066846145, -18.830216944), (-5.840290615, -21.210634256))
            ThreePointArc((-5.840290615, -21.210634256), (0, -22), (5.840290615, -21.210634256))
        make_face()
    # profile 51 of 57: a face of its own
    with BuildSketch(Plane.XY):
        with BuildLine():
            Line((-5.066846145, -18.830216944), (-4.834765807, -18.115947107))
            ThreePointArc((-4.834765807, -18.115947107), (-5.794068645, -17.832309681), (-6.736878839, -17.497913119))
            Line((-6.736878839, -17.497913119), (-6.968959178, -18.212182955))
            ThreePointArc((-6.968959178, -18.212182955), (-6.02583139, -18.545602068), (-5.066846145, -18.830216944))
        make_face()
    # profile 52 of 57: a face of its own
    with BuildSketch(Plane.XY):
        with BuildLine():
            ThreePointArc((-6.736878839, -17.497913119), (-11.02097348, -15.169068645), (-14.559694243, -11.814305039))
            Line((-14.559694243, -11.814305039), (-15.167288456, -12.255748075))
            ThreePointArc((-15.167288456, -12.255748075), (-11.46181242, -15.77583139), (-6.968959178, -18.212182955))
            Line((-6.968959178, -18.212182955), (-6.736878839, -17.497913119))
        make_face()
    # profile 53 of 57: a face of its own
    with BuildSketch(Plane.XY):
        with BuildLine():
            Line((-15.167288456, -12.255748075), (-14.559694243, -11.814305039))
            ThreePointArc((-14.559694243, -11.814305039), (-15.169068645, -11.02097348), (-15.735264747, -10.196271051))
            Line((-15.735264747, -10.196271051), (-16.342858961, -10.637714087))
            ThreePointArc((-16.342858961, -10.637714087), (-15.77583139, -11.46181242), (-15.167288456, -12.255748075))
        make_face()
    # profile 54 of 57: a face of its own
    with BuildSketch(Plane.XY):
        with BuildLine():
            Line((-19.474342094, 1), (-18.723314343, 1))
            ThreePointArc((-18.723314343, 1), (-17.832309681, 5.794068645), (-15.735264747, 10.196271051))
            Line((-15.735264747, 10.196271051), (-16.342858961, 10.637714087))
            ThreePointArc((-16.342858961, 10.637714087), (-18.545602068, 6.02583139), (-19.474342094, 1))
        make_face()
    # profile 55 of 57: a face of its own
    with BuildSketch(Plane.XY):
        with BuildLine():
            Line((-19.474342094, -1), (-18.723314343, -1))
            ThreePointArc((-18.723314343, -1), (-18.75, 0), (-18.723314343, 1))
            Line((-18.723314343, 1), (-19.474342094, 1))
            ThreePointArc((-19.474342094, 1), (-19.5, 0), (-19.474342094, -1))
        make_face()
    # profile 56 of 57: a face of its own
    with BuildSketch(Plane.XY):
        with BuildLine():
            Line((-16.342858961, -10.637714087), (-15.735264747, -10.196271051))
            ThreePointArc((-15.735264747, -10.196271051), (-17.832309681, -5.794068645), (-18.723314343, -1))
            Line((-18.723314343, -1), (-19.474342094, -1))
            ThreePointArc((-19.474342094, -1), (-18.545602068, -6.02583139), (-16.342858961, -10.637714087))
        make_face()
    # profile 57 of 57: a face of its own
    with BuildSketch(Plane.XY):
        with BuildLine():
            Line((-5.840290615, -21.210634256), (-5.066846145, -18.830216944))
            ThreePointArc((-5.066846145, -18.830216944), (-6.02583139, -18.545602068), (-6.968959178, -18.212182955))
            Line((-6.968959178, -18.212182955), (-7.742403648, -20.592600267))
            ThreePointArc((-7.742403648, -20.592600267), (-6.798373876, -20.923243358), (-5.840290615, -21.210634256))
        make_face()
    extrude(amount=BOSS_EXTRU_1_DEPTH)

    # Esquisse4 → Boss.-Extru.3 (add)
    with BuildSketch(Plane(origin=(0, 0, 0), x_dir=(-1, 0, 0), z_dir=(0, 0, -1))):
        Circle(ESQUISSE4_R)
        Circle(ESQUISSE4_R_2, mode=Mode.SUBTRACT)
    extrude(amount=-BOSS_EXTRU_3_DEPTH)


solid = part.part
